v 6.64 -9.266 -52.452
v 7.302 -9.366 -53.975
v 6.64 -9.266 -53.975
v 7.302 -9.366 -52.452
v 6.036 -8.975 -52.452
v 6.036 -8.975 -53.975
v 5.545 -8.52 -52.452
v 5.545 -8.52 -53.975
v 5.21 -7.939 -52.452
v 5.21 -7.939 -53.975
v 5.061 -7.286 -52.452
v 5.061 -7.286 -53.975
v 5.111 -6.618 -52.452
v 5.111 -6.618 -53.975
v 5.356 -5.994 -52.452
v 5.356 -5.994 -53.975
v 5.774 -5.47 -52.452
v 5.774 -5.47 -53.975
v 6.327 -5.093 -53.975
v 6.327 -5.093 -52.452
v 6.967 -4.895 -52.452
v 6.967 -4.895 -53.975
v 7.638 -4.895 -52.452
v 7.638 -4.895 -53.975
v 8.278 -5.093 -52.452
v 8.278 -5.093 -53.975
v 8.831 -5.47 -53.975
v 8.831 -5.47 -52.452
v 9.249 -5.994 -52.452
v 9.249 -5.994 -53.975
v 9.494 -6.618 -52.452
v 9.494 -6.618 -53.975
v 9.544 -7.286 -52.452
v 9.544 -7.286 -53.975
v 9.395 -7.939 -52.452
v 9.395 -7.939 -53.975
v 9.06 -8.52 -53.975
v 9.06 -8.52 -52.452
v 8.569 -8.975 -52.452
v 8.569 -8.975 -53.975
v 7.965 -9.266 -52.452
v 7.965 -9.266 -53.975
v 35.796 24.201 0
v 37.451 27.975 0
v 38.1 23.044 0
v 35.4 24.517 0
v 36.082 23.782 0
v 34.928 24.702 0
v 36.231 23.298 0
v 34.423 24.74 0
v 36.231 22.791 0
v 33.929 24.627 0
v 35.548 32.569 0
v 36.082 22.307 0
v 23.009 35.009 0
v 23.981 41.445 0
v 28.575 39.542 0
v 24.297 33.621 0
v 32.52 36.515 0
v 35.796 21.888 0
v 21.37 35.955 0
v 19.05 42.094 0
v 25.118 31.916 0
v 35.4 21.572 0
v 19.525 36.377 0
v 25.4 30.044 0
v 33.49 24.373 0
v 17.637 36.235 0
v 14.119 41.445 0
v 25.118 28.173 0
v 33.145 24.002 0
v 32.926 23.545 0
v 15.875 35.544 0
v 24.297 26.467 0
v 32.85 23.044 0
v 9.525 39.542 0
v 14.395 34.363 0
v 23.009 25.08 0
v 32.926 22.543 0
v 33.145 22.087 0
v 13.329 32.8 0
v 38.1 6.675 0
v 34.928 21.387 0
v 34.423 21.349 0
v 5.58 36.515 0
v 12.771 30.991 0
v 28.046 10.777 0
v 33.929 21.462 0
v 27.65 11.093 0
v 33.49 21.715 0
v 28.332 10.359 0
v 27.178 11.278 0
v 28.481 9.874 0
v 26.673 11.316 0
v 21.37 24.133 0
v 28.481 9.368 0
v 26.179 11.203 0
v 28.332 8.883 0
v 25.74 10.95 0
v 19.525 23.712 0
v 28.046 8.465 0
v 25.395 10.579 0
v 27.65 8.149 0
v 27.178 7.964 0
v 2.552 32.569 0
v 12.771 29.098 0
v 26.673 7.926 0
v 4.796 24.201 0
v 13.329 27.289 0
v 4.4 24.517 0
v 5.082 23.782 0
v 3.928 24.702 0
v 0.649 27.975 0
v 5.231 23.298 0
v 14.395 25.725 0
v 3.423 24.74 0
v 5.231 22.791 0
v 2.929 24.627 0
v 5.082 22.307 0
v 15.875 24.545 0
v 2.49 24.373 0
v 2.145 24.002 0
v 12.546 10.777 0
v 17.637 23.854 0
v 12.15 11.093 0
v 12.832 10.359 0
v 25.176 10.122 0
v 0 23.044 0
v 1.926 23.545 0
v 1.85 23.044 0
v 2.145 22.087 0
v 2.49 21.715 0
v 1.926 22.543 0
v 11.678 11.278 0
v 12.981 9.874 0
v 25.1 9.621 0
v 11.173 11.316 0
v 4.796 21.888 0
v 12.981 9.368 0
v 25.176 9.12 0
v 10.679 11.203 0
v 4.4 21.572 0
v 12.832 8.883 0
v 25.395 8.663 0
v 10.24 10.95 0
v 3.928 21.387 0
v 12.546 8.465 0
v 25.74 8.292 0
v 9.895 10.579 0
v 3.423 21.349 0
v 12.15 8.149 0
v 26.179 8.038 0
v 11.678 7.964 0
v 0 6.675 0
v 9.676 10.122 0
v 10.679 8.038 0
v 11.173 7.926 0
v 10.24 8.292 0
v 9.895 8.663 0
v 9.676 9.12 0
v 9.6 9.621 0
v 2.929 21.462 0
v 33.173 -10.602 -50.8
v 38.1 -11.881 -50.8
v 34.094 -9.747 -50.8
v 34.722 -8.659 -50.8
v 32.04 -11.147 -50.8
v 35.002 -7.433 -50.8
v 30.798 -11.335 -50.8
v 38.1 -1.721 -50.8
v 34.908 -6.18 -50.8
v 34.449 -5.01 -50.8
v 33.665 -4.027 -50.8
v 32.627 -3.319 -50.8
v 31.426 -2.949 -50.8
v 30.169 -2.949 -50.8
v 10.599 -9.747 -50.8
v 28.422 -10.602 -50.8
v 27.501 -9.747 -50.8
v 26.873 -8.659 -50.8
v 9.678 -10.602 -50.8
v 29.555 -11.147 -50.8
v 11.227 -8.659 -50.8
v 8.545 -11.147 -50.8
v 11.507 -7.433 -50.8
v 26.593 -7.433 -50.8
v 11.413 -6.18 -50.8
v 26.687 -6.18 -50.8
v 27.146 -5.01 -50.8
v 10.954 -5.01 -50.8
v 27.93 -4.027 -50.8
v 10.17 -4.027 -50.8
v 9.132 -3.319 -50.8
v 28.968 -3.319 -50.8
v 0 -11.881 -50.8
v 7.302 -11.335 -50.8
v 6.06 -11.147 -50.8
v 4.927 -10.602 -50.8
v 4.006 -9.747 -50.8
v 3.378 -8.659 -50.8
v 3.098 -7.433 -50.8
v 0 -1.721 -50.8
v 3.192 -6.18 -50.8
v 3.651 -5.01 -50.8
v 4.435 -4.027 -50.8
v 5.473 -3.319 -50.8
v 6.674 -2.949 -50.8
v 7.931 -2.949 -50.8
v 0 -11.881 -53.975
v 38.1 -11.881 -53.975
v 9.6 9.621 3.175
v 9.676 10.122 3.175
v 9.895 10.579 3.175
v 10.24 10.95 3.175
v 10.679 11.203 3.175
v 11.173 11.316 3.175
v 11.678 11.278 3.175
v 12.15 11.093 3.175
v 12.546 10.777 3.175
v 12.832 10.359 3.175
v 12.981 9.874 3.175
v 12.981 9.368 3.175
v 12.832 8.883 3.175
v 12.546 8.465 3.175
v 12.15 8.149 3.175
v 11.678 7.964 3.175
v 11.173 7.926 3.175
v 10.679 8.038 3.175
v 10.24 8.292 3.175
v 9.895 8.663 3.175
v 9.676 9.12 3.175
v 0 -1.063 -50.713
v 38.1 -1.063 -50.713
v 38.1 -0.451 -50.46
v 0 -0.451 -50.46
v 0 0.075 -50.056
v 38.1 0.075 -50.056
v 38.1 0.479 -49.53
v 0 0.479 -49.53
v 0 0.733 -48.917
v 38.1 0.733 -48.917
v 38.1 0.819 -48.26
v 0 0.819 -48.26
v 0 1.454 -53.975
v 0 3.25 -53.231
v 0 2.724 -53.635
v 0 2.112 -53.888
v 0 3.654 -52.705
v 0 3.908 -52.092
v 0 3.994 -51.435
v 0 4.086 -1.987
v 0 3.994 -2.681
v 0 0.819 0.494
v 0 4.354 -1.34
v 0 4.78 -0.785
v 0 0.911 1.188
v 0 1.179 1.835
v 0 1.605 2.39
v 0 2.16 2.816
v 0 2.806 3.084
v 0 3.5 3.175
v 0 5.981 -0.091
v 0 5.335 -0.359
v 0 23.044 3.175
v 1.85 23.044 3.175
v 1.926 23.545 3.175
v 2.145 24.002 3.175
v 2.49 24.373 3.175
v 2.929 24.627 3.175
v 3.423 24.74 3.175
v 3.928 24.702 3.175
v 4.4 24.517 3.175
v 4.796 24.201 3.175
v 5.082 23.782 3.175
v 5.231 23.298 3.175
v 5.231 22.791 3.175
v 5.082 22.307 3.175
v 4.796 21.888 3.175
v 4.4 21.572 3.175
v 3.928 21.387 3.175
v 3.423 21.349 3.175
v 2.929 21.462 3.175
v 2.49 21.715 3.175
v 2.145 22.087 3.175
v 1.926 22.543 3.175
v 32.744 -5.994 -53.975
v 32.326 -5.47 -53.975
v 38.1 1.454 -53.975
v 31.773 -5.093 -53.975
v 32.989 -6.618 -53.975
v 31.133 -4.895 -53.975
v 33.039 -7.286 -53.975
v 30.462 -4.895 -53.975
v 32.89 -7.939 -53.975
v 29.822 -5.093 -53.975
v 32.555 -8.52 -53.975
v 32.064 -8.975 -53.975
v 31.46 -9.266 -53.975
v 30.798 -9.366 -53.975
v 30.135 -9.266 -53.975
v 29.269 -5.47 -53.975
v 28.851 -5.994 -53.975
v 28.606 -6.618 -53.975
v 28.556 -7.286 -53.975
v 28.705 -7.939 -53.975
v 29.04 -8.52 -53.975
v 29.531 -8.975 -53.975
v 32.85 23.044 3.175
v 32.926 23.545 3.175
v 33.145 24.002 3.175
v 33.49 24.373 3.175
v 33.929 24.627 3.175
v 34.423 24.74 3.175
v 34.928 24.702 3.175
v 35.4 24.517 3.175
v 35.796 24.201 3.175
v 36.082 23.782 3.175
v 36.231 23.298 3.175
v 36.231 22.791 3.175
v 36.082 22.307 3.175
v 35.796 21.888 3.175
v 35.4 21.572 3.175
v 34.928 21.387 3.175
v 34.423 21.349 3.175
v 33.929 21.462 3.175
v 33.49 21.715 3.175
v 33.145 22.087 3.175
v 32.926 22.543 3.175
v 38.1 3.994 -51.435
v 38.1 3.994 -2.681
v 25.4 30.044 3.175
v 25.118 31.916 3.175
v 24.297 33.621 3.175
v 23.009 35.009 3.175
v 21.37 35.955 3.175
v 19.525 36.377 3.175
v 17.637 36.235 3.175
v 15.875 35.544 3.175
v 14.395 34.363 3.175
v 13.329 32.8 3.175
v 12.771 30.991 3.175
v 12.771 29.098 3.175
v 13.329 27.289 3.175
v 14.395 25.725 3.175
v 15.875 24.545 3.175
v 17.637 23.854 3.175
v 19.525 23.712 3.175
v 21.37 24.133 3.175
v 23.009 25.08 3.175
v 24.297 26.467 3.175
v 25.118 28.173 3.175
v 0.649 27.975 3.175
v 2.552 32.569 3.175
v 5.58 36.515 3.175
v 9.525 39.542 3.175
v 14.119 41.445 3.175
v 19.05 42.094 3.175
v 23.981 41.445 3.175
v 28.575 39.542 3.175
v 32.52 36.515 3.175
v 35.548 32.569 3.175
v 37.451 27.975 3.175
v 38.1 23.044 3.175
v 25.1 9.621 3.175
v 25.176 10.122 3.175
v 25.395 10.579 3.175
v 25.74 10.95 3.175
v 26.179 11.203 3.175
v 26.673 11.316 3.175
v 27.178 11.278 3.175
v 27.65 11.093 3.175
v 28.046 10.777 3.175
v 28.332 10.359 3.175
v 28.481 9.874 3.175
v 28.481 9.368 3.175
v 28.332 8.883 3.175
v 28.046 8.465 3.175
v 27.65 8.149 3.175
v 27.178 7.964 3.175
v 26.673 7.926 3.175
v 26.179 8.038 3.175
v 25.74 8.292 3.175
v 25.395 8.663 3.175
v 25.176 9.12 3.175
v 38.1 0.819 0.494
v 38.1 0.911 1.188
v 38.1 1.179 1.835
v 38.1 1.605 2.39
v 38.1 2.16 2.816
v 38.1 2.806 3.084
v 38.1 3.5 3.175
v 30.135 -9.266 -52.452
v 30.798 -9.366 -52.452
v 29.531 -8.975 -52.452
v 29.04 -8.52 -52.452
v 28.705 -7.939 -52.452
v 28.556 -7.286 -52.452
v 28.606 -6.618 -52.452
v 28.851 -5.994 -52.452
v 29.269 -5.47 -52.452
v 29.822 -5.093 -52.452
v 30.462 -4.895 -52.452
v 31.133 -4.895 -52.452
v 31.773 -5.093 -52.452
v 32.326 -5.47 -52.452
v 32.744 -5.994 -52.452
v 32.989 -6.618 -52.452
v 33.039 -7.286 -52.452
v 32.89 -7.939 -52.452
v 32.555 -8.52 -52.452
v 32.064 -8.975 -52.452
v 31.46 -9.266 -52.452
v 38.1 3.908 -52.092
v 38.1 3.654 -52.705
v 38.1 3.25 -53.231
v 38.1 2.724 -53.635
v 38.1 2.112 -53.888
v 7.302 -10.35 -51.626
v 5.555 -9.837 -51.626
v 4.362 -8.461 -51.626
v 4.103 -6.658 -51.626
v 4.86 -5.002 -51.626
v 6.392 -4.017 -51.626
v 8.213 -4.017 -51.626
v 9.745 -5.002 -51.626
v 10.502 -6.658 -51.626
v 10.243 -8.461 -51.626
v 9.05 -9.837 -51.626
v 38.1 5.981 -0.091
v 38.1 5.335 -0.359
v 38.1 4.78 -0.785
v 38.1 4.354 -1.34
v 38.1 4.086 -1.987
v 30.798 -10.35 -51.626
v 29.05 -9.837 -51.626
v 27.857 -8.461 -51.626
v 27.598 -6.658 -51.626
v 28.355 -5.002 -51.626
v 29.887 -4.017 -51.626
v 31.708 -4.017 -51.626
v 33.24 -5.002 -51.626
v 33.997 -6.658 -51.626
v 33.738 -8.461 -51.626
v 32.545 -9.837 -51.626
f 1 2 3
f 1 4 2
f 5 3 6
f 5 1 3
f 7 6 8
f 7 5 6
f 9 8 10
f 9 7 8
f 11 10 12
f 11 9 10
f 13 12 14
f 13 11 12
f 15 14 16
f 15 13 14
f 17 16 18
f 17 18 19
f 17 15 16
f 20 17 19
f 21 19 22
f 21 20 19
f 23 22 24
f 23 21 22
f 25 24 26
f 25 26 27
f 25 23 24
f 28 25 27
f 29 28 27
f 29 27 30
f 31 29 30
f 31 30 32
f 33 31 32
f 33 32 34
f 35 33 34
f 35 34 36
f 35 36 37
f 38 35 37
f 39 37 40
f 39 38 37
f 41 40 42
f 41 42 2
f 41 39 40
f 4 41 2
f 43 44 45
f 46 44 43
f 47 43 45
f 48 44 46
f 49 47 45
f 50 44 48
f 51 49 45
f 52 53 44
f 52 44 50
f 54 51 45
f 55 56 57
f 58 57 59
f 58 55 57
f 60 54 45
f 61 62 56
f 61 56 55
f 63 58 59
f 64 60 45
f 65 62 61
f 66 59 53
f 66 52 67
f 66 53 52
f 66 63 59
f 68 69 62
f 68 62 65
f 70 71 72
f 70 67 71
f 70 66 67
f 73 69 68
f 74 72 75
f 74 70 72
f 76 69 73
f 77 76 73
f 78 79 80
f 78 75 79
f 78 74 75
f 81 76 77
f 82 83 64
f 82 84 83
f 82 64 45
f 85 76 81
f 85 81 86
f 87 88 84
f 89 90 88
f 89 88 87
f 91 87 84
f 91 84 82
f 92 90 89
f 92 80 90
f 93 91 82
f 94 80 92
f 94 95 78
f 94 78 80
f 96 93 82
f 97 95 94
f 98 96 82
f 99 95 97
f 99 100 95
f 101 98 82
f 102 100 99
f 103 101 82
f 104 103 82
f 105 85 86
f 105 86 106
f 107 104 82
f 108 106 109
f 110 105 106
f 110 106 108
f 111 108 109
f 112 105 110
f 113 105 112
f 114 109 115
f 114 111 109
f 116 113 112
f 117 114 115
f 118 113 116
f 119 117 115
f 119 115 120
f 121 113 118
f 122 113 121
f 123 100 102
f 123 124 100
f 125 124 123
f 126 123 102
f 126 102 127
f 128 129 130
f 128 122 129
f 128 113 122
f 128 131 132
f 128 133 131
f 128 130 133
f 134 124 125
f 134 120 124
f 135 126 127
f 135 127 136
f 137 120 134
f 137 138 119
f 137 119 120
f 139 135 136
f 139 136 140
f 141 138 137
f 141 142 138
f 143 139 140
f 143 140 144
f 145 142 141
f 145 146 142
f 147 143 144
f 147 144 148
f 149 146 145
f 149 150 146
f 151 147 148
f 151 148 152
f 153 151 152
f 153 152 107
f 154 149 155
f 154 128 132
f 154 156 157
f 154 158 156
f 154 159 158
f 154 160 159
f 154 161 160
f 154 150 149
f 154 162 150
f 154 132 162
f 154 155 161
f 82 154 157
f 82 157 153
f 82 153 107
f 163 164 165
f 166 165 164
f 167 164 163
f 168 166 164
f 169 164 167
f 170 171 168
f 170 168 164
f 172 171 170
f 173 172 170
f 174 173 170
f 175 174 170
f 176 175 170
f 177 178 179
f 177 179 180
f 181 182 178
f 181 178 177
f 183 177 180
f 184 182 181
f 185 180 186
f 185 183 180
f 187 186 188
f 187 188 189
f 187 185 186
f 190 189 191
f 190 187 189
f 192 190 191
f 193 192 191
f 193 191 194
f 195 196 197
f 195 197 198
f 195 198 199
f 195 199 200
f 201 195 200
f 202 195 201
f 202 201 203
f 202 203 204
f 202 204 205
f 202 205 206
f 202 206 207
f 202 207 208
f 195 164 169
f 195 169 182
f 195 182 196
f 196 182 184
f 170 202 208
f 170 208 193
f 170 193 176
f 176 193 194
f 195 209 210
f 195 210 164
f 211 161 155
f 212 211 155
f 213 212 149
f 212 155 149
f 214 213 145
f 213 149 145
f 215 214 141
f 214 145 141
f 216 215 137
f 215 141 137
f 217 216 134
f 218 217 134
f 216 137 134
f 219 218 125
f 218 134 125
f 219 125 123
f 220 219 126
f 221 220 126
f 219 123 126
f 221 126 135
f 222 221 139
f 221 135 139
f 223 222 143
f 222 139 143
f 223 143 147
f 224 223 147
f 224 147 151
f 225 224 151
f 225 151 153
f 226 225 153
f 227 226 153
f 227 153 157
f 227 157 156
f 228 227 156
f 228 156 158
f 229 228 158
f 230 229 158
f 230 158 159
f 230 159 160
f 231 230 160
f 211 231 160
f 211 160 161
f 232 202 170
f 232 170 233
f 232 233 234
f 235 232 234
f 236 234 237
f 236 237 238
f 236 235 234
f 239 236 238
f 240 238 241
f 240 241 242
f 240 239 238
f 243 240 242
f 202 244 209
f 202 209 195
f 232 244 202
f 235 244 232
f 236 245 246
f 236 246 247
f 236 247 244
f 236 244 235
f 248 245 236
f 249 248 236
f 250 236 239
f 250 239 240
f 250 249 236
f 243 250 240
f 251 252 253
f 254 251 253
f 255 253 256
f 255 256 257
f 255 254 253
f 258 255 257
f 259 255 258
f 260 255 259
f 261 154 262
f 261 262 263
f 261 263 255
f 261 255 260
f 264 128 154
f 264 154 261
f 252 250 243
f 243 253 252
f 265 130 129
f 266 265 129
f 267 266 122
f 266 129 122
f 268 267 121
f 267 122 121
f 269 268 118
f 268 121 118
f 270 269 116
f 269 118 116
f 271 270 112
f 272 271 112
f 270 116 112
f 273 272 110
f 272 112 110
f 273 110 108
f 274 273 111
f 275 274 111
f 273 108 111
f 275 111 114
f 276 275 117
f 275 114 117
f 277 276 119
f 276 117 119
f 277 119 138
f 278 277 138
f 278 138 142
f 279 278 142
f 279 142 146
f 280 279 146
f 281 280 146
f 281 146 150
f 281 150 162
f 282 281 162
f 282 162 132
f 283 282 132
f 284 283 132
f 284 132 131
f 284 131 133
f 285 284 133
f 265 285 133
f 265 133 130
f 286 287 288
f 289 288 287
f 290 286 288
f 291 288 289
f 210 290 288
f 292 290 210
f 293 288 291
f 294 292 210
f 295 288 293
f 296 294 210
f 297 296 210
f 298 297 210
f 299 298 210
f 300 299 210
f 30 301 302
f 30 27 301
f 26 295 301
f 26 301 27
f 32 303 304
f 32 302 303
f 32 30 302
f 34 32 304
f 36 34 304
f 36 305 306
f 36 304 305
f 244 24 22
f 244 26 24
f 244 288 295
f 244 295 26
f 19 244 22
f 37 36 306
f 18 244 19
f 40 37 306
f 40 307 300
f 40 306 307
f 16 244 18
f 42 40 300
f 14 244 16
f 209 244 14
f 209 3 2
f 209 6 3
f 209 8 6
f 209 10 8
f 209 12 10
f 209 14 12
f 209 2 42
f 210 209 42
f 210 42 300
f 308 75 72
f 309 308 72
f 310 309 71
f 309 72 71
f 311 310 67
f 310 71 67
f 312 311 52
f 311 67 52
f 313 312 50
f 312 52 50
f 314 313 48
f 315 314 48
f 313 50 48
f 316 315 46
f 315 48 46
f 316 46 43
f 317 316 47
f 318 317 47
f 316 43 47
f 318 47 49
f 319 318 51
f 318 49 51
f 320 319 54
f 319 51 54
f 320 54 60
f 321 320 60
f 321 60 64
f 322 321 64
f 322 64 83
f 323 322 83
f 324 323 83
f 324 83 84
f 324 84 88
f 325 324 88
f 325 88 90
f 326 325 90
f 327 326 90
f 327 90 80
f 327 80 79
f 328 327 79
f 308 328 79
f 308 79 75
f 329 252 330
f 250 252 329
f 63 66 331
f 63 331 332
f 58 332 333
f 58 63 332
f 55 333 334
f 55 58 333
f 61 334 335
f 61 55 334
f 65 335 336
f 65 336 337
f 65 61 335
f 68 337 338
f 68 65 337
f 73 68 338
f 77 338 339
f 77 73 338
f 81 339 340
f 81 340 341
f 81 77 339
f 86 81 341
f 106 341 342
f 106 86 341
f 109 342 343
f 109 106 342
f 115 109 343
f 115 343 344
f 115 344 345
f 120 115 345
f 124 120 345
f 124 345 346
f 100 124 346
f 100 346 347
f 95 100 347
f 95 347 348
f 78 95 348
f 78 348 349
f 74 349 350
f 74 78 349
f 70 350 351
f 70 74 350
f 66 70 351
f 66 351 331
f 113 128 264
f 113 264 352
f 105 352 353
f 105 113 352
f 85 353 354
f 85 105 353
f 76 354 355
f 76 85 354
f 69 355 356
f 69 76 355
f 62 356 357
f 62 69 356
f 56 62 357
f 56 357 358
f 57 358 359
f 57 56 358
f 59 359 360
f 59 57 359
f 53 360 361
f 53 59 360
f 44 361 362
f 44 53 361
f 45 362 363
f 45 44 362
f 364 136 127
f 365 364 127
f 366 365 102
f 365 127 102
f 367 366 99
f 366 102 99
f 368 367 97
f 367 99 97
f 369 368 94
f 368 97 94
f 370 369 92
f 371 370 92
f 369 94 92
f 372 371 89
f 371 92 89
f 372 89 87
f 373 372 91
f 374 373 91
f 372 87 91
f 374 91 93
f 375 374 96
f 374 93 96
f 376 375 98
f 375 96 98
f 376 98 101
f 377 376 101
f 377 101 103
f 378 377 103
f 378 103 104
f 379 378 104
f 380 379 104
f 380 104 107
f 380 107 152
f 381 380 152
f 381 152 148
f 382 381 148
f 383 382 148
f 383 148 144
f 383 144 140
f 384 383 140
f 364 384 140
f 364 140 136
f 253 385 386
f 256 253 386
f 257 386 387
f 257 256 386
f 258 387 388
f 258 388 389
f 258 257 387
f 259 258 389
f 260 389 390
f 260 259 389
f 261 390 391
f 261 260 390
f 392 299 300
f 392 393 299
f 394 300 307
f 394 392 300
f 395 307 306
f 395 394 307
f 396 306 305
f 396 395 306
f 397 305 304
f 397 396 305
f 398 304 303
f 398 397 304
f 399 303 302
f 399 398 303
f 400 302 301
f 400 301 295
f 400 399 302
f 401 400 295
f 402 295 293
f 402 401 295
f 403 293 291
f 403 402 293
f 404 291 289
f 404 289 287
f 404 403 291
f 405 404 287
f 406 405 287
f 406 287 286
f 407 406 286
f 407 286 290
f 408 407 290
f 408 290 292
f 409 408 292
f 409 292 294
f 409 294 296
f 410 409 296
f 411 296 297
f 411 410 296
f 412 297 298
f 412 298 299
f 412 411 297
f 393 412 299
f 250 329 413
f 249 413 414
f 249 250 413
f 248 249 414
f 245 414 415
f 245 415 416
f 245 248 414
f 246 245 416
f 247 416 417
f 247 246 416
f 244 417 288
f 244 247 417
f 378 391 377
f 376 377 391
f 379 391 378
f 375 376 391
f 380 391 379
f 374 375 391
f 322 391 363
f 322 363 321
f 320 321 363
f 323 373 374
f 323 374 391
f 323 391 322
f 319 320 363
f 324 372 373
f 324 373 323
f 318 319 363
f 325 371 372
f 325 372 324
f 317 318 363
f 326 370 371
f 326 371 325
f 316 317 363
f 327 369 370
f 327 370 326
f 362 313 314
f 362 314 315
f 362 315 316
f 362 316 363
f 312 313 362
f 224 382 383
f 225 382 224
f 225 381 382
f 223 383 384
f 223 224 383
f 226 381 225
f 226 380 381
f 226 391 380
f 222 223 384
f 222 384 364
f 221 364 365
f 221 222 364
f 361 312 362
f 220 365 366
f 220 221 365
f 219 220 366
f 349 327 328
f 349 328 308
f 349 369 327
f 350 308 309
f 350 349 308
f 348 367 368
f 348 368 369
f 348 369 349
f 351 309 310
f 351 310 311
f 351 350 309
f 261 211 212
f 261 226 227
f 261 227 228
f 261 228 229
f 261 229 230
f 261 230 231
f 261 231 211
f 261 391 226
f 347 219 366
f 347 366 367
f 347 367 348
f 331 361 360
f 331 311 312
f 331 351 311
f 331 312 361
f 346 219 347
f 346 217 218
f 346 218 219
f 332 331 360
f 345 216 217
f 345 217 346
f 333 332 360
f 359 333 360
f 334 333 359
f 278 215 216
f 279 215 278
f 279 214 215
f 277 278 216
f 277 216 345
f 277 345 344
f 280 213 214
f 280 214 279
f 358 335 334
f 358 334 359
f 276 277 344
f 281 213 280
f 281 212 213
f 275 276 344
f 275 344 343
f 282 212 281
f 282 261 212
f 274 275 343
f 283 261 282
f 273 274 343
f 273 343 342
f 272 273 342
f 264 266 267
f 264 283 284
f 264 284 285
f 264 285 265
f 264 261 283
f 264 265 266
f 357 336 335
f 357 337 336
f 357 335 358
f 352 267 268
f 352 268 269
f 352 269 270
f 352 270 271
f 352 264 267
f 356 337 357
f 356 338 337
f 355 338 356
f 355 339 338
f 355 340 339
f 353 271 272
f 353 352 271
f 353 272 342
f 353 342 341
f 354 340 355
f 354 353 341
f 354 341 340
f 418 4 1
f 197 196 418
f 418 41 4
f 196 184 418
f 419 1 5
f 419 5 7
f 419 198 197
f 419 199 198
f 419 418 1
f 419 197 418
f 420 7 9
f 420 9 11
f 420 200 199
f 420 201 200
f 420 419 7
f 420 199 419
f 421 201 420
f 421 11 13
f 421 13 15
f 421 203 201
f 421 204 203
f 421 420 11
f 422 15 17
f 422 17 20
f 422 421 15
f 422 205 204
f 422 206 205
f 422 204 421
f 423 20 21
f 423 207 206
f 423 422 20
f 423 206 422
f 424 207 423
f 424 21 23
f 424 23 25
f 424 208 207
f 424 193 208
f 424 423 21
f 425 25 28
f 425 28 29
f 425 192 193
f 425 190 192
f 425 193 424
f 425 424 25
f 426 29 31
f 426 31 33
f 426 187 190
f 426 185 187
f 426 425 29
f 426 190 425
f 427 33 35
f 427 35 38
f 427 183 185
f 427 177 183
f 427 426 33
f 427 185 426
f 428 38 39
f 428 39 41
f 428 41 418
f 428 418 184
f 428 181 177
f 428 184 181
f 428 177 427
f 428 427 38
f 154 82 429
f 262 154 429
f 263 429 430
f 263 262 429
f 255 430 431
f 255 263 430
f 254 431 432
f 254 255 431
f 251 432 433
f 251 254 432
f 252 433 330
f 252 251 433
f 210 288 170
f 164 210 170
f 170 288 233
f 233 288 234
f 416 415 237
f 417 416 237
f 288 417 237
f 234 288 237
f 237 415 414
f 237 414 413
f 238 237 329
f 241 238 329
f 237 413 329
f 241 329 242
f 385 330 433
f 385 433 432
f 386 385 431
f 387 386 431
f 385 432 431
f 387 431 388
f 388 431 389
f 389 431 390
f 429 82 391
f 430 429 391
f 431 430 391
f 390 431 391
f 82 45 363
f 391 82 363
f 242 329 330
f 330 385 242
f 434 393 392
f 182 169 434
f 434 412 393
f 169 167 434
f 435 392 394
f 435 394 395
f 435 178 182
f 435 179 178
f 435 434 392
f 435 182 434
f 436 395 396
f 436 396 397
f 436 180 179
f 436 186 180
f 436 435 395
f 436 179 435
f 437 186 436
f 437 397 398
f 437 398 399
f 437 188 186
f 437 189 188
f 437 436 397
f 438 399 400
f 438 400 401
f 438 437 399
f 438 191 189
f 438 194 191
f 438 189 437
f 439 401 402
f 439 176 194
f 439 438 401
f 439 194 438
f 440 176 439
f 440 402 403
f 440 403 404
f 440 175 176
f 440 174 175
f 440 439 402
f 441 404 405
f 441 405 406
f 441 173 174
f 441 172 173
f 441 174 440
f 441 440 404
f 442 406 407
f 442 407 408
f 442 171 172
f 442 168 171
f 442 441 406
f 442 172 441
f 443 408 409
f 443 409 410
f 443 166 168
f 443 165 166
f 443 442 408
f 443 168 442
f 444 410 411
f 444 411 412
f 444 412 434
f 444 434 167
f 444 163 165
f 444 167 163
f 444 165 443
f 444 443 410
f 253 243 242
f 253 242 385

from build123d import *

# Parameters (mm, degrees)
BOSS_EXTRUDE1_DEPTH                       = 38.1
CSK_FOR_8_FLAT_HEAD_MACHINE_SCREW_2_COUNT = 2
CSK_FOR_8_FLAT_HEAD_MACHINE_SCREW_2_PITCH = 23.495
SKETCH11_R                                = 6.35
CUT_EXTRUDE1_DEPTH                        = 81.558479852
M3_CLEARANCE_HOLE1_D                      = 3.4


with BuildPart() as part:
    # Sketch1 → Boss-Extrude1 (new body)
    with BuildSketch(Plane(origin=(0, 0, 0), x_dir=(0, 0, -1), z_dir=(1, 0, 0))):
        with BuildLine():
            Line((0, 42.094372261), (0, 6.675328802))
            ThreePointArc((0, 6.675328802), (0.785233991, 4.779606252), (2.680956542, 3.994372261))
            Line((2.680956542, 3.994372261), (51.435, 3.994372261))
            ThreePointArc((51.435, 3.994372261), (53.231051224, 3.250423485), (53.975, 1.454372261))
            Line((53.975, 1.454372261), (53.975, -11.880627739))
            Line((53.975, -11.880627739), (50.8, -11.880627739))
            Line((50.8, -11.880627739), (50.8, -1.720627739))
            ThreePointArc((50.8, -1.720627739), (50.056051224, 0.075423485), (48.26, 0.819372261))
            Line((48.26, 0.819372261), (-0.494043458, 0.819372261))
            ThreePointArc((-0.494043458, 0.819372261), (-2.389766009, 1.604606252), (-3.175, 3.500328802))
            Line((-3.175, 3.500328802), (-3.175, 42.094372261))
            Line((-3.175, 42.094372261), (0, 42.094372261))
        make_face()
    extrude(amount=BOSS_EXTRUDE1_DEPTH)

    # Sketch10 → CSK for #8 Flat Head Machine Screw (100)2 (revolve, cut)
    with BuildSketch(Plane(origin=(7.3025, -7.118127739, -50.8), x_dir=(0, -1, 0), z_dir=(1, 0, 0))):
        Polygon((0, 0), (0, 3.175), (2.2479, 3.175), (2.2479, 1.651767624), (4.2164, 0), align=None)
    csk_for_8_flat_head_machine_screw_100 = revolve(axis=Axis((7.3025, -7.118127739, -44.45), (0, 0, -1)), mode=Mode.SUBTRACT)

    # CSK for _8 Flat Head Machine Screw _ 2: CSK for #8 Flat Head Machine Screw (100)2 ×2
    with Locations(*[(i * CSK_FOR_8_FLAT_HEAD_MACHINE_SCREW_2_PITCH, 0, 0) for i in range(1, CSK_FOR_8_FLAT_HEAD_MACHINE_SCREW_2_COUNT)]):
        add(csk_for_8_flat_head_machine_screw_100, mode=Mode.SUBTRACT)

    # Sketch11 → Cut-Extrude1 (cut, through all)
    with BuildSketch(Plane.XY.offset(3.175)):
        with BuildLine():
            Line((38.1, 42.094372261), (19.05, 42.094372261))
            ThreePointArc((19.05, 42.094372261), (32.520384182, 36.514756442), (38.1, 23.044372261))
            Line((38.1, 23.044372261), (38.1, 42.094372261))
        make_face()
        with BuildLine():
            Line((0, 42.094372261), (0, 23.044372261))
            ThreePointArc((0, 23.044372261), (5.579615818, 36.514756442), (19.05, 42.094372261))
            Line((19.05, 42.094372261), (0, 42.094372261))
        make_face()
        with Locations((19.05, 30.044372261)):
            Circle(SKETCH11_R)
    extrude(amount=-CUT_EXTRUDE1_DEPTH, mode=Mode.SUBTRACT)

    # M3 Clearance Hole1 (through all)
    with Locations(Plane.XY.offset(3.175)):
        with Locations((3.55, 23.044372261), (34.55, 23.044372261), (26.8, 9.620978502), (11.3, 9.620978502)):
            Hole(M3_CLEARANCE_HOLE1_D / 2)


solid = part.part
